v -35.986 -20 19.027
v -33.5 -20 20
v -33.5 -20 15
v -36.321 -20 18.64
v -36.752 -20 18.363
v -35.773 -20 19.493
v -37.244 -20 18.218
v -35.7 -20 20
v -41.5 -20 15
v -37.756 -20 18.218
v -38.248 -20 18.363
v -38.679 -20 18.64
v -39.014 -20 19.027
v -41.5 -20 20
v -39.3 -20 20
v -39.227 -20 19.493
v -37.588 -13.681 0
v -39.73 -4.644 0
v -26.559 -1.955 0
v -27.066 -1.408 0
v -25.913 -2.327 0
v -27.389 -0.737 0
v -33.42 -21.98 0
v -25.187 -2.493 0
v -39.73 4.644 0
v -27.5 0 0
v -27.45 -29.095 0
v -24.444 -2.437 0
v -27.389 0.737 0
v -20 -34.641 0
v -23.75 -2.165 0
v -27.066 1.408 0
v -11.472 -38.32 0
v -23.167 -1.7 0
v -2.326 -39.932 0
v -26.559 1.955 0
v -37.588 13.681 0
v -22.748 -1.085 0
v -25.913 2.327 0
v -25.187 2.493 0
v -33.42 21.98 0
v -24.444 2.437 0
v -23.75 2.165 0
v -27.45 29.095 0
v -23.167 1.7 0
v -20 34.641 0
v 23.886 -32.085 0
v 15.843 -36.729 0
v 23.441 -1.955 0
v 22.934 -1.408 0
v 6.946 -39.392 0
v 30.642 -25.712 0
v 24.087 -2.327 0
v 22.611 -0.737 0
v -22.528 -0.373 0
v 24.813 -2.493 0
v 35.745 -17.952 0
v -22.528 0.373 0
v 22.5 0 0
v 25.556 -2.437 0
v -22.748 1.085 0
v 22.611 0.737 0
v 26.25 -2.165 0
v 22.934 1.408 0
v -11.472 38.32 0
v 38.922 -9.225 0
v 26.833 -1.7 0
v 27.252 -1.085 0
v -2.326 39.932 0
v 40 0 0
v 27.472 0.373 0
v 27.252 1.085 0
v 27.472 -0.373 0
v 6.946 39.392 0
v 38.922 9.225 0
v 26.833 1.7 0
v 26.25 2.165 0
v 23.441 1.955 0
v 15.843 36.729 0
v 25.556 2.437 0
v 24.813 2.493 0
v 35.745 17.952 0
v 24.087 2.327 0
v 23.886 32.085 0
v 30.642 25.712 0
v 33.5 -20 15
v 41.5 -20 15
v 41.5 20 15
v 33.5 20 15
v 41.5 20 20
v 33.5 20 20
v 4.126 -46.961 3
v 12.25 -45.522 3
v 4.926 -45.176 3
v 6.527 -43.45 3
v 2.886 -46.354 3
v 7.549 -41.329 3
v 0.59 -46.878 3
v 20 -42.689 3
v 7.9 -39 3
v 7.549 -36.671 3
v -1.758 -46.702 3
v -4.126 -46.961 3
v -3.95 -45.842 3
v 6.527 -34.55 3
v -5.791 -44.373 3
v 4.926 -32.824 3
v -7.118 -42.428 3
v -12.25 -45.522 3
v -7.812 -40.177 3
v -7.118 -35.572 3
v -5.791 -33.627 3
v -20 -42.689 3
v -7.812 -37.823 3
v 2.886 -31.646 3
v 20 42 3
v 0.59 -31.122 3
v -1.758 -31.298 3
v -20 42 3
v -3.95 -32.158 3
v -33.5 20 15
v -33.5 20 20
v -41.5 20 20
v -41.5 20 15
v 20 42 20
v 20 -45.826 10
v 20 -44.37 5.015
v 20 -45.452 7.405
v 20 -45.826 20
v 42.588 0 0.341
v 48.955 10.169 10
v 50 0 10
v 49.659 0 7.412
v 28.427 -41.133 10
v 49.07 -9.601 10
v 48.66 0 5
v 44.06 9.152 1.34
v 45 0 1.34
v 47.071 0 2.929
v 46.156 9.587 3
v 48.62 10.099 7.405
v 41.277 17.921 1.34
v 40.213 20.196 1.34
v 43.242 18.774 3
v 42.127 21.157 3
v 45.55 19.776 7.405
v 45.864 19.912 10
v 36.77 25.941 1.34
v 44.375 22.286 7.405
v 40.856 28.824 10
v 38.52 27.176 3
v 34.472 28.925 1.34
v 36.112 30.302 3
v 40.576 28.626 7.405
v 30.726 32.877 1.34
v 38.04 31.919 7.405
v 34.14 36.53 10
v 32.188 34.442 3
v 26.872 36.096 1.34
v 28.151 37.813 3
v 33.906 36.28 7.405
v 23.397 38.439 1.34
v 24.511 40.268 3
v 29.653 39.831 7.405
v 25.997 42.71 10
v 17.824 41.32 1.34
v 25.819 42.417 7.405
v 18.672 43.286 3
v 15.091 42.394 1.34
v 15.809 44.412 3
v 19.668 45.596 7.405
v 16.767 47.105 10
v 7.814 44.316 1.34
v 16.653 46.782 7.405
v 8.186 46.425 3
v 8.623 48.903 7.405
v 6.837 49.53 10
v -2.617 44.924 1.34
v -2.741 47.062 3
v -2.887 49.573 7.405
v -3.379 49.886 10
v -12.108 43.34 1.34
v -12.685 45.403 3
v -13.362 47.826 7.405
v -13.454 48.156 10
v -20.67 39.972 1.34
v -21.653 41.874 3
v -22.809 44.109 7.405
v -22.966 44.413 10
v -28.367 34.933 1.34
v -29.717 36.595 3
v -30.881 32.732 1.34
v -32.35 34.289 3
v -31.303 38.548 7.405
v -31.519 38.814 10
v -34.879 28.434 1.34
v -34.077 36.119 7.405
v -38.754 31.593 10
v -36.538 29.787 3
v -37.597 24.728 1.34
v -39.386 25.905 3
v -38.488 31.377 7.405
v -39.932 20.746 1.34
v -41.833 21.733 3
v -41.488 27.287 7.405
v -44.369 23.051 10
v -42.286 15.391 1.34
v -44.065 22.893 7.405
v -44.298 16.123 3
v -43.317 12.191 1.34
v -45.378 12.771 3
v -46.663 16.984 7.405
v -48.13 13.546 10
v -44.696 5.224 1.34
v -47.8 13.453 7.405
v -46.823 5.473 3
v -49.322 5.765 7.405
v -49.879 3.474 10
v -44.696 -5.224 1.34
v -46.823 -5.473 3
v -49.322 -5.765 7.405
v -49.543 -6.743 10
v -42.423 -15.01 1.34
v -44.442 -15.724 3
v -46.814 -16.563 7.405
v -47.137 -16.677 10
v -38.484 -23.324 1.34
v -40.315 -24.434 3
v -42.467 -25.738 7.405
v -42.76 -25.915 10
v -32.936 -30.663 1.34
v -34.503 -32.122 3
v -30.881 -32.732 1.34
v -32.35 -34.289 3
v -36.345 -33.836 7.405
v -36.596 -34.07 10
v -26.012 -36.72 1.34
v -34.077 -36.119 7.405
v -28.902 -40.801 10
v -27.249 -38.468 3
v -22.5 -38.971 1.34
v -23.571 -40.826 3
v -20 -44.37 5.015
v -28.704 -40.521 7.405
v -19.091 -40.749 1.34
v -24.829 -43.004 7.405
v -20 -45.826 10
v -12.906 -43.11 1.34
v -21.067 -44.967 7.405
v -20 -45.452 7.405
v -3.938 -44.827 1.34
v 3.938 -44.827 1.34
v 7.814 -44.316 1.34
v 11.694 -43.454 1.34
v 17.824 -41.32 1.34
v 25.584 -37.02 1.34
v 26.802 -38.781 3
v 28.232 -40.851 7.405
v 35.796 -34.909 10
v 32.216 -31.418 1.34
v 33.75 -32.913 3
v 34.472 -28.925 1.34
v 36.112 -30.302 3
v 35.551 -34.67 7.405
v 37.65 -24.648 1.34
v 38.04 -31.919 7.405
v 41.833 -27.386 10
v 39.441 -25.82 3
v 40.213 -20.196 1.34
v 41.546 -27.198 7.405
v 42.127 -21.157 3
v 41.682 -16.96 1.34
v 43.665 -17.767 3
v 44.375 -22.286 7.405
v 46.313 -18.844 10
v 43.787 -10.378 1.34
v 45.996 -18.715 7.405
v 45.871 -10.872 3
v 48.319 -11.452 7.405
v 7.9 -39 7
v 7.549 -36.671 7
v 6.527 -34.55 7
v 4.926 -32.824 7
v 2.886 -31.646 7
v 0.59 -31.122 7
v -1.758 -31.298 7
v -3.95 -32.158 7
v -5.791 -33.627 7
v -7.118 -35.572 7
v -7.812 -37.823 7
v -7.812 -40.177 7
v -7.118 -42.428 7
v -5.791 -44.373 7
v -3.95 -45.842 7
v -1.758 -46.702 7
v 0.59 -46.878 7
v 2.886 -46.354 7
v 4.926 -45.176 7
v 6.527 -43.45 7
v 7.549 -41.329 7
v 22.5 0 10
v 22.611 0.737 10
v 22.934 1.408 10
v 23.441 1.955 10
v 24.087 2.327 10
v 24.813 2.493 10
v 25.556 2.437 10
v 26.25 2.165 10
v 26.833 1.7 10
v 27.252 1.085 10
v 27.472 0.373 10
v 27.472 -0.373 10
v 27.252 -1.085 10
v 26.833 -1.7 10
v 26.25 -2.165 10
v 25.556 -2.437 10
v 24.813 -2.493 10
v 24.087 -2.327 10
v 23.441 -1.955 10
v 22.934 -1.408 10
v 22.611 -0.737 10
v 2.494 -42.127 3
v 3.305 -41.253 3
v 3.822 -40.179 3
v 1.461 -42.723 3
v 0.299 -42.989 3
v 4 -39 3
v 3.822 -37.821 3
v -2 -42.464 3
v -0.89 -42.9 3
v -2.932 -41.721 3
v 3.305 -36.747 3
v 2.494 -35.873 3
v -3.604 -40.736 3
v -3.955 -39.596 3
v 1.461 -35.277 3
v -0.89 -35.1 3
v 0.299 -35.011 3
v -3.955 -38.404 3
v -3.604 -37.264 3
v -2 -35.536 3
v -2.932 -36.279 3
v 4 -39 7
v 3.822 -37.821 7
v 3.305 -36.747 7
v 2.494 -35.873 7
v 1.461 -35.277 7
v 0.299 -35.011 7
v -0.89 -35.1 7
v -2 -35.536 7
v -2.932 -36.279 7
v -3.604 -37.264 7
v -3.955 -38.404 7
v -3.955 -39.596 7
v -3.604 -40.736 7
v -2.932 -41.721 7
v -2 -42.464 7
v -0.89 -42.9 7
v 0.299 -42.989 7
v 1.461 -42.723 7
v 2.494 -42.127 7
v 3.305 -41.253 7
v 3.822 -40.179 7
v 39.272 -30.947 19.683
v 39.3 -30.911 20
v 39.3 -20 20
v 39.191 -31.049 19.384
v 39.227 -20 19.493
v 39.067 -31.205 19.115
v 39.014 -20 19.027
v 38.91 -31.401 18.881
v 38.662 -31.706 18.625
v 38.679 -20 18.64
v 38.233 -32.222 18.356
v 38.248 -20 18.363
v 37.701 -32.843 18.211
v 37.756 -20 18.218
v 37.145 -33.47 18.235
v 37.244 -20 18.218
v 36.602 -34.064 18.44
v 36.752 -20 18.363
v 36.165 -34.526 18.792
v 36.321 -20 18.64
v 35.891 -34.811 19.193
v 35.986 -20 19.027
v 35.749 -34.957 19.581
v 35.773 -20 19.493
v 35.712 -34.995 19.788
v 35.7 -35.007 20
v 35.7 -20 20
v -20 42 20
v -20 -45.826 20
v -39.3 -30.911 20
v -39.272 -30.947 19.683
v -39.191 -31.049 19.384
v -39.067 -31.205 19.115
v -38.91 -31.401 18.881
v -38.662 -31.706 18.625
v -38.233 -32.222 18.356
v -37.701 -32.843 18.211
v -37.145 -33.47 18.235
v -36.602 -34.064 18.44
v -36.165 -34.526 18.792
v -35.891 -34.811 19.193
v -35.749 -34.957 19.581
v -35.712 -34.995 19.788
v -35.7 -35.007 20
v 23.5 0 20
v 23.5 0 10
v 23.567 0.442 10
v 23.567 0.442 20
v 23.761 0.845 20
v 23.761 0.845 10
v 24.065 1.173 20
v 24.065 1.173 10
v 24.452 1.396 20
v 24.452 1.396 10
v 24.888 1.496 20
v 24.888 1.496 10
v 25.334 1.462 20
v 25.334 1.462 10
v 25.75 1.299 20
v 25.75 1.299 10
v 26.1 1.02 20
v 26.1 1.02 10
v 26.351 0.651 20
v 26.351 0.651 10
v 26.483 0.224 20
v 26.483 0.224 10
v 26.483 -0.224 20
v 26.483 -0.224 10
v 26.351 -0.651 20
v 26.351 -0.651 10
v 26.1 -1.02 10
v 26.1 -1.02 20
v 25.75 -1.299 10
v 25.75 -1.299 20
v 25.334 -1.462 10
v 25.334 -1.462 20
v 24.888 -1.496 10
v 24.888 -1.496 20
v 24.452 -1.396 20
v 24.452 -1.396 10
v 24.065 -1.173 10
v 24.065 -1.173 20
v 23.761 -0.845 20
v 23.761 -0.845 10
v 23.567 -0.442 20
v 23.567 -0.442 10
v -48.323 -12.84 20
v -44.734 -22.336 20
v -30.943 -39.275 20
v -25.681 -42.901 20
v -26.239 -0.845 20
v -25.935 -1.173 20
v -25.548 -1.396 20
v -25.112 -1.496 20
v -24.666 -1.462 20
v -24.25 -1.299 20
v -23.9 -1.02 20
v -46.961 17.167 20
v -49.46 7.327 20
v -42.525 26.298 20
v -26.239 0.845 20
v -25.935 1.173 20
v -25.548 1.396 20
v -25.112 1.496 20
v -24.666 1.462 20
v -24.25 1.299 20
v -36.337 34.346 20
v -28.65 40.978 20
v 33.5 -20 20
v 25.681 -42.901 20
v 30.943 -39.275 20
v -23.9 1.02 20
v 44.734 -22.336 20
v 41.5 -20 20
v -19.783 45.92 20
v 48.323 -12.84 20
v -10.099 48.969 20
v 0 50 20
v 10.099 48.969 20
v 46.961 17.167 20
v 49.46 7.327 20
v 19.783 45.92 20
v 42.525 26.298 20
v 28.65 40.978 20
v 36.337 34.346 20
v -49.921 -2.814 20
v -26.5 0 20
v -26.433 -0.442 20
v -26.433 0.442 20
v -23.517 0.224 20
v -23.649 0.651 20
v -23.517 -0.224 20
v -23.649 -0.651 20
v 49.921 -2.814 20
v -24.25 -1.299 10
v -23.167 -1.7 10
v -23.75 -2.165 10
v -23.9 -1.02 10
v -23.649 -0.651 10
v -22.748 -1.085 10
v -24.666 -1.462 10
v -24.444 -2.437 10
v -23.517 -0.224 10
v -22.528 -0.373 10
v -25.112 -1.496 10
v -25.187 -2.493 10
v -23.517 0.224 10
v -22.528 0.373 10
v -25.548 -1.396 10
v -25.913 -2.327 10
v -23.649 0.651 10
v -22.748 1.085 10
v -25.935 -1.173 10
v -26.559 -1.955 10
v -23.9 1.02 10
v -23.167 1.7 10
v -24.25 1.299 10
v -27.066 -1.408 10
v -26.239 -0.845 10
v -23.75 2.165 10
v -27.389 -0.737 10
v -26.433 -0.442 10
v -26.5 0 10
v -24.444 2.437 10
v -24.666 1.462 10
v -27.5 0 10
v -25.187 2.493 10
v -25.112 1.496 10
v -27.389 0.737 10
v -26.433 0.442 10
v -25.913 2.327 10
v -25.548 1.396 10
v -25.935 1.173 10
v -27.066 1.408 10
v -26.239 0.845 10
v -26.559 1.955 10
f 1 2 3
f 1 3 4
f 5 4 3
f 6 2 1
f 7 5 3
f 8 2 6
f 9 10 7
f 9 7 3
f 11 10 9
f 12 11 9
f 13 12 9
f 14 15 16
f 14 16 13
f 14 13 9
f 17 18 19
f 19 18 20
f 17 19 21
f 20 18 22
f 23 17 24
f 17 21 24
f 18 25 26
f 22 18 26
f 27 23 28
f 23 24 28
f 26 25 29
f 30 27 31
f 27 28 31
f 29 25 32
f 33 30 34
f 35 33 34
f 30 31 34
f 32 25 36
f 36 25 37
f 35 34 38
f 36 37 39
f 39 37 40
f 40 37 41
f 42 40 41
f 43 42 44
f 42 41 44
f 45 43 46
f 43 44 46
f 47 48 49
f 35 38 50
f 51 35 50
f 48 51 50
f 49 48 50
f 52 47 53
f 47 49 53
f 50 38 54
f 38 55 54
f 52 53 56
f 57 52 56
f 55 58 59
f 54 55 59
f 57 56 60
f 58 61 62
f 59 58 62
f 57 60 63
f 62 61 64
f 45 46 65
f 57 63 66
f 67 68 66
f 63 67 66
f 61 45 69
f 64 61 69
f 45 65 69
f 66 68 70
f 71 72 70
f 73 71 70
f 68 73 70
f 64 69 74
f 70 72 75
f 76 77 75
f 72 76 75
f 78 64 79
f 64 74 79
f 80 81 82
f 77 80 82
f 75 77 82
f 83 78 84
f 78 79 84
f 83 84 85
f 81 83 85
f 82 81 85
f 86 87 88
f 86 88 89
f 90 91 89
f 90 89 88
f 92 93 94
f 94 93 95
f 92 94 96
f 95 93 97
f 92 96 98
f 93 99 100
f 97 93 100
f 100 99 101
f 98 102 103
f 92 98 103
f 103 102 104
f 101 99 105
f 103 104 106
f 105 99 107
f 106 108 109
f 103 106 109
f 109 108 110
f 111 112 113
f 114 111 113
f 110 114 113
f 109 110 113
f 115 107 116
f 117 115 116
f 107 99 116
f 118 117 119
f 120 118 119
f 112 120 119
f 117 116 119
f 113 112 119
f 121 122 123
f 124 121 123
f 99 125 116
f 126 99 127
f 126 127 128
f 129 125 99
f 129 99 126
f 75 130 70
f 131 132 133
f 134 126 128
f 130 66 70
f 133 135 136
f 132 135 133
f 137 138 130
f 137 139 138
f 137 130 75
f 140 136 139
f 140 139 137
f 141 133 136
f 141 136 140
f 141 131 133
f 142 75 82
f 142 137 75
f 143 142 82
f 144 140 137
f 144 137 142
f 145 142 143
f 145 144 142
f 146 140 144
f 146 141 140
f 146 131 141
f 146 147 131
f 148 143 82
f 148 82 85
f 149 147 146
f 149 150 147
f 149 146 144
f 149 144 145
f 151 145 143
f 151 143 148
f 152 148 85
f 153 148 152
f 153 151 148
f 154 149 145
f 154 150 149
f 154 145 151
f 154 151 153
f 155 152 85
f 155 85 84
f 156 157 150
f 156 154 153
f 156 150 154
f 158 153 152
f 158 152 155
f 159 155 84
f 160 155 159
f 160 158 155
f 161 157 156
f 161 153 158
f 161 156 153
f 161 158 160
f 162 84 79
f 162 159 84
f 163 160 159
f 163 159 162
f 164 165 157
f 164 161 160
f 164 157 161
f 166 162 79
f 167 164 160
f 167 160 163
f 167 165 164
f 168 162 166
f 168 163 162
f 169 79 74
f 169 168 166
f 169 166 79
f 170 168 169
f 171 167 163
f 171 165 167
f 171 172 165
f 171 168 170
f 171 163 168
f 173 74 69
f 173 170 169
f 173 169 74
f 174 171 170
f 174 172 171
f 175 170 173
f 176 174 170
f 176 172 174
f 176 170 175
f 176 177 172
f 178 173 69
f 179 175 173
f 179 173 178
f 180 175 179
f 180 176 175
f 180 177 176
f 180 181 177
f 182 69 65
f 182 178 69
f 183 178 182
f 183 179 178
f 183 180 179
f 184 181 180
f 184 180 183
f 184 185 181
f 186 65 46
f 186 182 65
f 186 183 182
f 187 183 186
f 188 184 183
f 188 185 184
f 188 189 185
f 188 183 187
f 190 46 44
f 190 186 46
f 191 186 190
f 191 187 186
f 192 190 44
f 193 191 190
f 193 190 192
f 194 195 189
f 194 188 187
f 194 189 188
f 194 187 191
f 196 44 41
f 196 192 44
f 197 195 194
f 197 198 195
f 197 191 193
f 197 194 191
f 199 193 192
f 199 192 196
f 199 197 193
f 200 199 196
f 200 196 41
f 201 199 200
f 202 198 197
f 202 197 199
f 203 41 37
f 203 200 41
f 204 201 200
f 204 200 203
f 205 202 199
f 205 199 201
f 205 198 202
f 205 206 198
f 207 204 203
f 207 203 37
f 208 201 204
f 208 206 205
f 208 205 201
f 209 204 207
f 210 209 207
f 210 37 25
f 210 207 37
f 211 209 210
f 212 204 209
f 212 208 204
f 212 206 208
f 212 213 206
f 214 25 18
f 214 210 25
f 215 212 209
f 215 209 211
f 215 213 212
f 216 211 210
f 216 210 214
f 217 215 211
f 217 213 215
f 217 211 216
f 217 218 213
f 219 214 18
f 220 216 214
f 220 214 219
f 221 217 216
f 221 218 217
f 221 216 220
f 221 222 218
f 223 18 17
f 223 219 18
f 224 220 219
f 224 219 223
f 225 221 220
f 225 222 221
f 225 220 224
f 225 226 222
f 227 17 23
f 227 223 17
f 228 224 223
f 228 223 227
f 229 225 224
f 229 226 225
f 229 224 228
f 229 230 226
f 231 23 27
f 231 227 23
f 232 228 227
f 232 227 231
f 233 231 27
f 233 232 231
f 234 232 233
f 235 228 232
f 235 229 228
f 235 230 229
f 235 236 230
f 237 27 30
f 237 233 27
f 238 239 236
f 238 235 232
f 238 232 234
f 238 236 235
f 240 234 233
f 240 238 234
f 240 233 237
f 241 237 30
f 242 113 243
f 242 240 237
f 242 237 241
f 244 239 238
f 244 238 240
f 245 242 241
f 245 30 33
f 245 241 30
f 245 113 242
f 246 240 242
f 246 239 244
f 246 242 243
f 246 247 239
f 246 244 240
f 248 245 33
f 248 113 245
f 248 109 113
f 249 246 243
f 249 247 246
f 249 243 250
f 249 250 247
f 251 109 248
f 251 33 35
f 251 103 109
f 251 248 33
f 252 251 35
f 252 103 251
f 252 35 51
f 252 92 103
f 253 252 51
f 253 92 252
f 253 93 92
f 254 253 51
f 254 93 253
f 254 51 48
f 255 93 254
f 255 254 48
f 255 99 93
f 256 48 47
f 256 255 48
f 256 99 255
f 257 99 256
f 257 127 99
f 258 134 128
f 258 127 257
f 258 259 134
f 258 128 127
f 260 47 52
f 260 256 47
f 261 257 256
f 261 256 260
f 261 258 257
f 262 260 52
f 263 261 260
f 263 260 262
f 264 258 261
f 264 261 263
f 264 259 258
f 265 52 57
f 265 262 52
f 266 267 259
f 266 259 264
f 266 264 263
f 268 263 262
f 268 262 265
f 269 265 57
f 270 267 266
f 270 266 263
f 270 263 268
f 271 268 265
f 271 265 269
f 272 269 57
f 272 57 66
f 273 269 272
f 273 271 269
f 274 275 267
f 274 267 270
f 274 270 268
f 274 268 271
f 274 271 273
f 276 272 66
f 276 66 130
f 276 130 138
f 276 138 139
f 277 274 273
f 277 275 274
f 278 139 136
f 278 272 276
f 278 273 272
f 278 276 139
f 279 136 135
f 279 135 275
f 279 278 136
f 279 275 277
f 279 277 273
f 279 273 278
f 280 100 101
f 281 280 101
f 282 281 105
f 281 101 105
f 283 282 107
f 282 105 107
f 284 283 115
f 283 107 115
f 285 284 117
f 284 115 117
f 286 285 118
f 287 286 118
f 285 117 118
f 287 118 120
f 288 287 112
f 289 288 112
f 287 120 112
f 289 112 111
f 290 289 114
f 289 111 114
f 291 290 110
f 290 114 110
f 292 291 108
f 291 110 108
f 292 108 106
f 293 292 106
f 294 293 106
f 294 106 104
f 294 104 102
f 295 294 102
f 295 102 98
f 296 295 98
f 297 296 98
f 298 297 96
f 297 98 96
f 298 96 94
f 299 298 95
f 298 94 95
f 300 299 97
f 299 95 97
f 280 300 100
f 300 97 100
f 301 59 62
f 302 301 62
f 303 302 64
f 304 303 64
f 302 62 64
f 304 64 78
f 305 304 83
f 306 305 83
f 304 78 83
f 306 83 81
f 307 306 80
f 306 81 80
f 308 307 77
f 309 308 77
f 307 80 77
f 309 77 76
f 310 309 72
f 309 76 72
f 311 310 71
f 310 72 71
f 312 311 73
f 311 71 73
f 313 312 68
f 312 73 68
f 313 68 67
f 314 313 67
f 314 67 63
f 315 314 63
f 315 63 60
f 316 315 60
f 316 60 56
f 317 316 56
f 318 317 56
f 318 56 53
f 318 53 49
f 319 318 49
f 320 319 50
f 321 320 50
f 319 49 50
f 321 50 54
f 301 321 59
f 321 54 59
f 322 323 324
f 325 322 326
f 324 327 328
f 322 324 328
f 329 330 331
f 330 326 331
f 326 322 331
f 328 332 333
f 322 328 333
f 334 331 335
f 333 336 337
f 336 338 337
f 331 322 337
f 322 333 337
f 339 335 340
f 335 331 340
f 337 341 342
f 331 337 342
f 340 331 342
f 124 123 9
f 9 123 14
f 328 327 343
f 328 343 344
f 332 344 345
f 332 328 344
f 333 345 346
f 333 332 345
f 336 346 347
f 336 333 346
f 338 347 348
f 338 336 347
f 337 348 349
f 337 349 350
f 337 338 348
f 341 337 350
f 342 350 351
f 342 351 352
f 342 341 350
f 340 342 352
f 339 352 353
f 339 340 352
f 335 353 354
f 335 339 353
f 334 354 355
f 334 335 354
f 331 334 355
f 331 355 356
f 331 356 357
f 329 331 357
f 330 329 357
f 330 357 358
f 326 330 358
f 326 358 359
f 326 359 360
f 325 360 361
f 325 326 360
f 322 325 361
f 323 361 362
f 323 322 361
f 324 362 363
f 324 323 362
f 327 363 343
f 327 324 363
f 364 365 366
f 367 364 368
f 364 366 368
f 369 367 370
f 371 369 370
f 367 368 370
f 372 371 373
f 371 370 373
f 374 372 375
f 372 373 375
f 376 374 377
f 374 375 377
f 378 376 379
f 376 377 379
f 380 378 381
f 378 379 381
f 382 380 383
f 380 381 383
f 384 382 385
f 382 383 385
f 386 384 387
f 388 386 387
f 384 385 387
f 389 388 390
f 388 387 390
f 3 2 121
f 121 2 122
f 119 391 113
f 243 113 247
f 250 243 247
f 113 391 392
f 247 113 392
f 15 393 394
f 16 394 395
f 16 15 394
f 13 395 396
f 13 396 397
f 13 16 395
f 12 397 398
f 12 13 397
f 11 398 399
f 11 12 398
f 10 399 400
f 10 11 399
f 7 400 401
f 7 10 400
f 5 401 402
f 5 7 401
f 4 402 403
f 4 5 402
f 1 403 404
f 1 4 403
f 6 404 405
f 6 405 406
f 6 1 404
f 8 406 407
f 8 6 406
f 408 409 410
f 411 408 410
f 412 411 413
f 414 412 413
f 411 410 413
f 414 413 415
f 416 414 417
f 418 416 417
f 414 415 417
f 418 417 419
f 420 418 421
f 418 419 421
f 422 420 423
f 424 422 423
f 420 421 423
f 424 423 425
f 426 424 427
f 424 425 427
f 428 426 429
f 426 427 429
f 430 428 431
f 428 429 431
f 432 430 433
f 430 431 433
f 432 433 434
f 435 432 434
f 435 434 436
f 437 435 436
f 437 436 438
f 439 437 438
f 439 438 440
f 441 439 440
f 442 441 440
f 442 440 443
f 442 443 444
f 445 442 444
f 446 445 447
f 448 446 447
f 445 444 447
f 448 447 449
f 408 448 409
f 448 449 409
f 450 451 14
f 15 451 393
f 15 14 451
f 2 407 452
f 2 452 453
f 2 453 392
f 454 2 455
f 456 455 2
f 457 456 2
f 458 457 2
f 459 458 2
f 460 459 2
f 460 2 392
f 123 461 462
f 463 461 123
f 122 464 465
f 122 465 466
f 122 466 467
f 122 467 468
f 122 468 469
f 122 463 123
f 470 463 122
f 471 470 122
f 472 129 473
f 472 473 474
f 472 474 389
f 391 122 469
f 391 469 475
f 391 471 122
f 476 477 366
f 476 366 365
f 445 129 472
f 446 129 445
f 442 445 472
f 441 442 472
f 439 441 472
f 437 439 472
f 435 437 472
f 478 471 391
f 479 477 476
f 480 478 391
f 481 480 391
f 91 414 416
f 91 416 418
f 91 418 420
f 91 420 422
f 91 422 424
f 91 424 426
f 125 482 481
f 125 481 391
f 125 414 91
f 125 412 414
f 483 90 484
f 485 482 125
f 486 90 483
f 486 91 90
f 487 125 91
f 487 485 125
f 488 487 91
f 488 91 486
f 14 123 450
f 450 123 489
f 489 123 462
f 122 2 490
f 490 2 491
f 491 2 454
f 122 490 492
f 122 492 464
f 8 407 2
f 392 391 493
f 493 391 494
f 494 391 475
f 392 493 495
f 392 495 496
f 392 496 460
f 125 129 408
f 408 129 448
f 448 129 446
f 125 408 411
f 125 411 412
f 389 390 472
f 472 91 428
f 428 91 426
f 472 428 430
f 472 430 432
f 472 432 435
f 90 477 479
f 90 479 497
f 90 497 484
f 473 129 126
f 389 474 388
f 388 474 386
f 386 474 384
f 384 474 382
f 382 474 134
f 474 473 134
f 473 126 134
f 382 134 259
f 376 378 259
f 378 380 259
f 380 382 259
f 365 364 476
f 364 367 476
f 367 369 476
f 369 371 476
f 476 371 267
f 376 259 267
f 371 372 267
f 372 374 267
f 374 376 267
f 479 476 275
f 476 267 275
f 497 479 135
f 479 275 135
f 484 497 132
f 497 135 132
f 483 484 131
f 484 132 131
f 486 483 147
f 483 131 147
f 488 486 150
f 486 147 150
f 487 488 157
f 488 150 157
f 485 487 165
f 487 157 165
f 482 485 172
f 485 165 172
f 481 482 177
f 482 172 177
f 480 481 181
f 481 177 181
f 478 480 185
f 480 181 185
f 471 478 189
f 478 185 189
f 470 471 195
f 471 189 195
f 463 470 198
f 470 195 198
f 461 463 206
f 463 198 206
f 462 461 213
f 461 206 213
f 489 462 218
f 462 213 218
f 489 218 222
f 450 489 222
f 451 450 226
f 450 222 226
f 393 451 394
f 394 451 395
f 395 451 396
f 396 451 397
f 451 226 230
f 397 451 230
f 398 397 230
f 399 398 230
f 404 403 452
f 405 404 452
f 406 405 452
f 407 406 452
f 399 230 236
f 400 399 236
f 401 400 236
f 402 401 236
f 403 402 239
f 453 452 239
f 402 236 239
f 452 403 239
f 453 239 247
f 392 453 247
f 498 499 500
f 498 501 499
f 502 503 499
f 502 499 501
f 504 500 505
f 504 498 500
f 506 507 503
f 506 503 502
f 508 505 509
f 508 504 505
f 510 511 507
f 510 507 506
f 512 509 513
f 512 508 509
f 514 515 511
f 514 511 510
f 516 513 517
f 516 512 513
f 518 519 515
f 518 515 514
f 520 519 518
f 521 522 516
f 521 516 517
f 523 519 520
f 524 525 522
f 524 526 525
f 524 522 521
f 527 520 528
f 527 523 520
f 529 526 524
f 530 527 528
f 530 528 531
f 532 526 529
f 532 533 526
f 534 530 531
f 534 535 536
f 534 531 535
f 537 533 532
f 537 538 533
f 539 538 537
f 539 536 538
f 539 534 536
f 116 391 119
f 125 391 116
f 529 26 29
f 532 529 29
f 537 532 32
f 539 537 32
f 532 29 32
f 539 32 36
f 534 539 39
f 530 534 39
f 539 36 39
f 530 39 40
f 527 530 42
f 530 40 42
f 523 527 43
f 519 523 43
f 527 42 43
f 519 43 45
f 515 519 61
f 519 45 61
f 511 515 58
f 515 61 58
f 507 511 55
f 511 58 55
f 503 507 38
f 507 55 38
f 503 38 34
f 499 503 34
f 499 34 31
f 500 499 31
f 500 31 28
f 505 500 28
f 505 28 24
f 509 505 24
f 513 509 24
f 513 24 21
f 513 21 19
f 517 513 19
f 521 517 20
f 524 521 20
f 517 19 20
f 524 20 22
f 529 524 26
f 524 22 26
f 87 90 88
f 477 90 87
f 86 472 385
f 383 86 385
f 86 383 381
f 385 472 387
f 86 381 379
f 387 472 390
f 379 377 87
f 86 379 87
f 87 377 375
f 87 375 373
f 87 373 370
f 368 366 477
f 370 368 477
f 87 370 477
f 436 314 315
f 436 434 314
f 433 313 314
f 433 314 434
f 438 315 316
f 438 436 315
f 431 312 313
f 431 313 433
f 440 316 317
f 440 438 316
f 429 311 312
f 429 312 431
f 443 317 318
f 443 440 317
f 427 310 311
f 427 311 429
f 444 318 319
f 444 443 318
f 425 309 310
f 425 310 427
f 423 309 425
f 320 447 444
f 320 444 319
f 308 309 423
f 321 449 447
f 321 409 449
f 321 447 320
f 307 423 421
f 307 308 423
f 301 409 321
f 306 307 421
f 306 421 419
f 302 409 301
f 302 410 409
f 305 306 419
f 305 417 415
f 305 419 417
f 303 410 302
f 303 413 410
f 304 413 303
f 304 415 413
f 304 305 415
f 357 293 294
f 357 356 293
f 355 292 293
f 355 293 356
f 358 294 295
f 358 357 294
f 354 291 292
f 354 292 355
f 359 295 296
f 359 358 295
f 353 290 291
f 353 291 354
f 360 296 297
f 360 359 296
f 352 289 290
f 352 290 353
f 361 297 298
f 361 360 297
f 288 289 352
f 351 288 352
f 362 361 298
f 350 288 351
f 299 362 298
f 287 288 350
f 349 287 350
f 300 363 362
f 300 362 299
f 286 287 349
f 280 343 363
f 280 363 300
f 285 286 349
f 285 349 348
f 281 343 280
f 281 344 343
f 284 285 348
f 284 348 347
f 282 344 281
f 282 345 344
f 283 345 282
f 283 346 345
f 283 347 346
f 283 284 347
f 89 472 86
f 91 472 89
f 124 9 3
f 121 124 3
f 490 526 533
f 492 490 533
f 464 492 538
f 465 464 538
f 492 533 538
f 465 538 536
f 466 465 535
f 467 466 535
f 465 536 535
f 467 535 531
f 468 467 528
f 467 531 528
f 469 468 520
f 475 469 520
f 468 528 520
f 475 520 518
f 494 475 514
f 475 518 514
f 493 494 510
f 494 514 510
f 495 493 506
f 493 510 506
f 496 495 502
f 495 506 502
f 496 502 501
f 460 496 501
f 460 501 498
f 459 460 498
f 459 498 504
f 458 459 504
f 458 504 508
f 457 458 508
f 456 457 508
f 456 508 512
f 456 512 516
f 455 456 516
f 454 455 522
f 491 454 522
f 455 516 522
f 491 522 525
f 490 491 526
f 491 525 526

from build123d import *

# Parameters (mm, degrees)
SKETCH_1_R          = 50
EXTRUDE_1_DEPTH     = 20
CUT_EXTRUDE_1_DEPTH = 17
SKETCH_3_R          = 7.9
SKETCH_3_R_2        = 4
EXTRUDE_2_DEPTH     = 4
CUT_EXTRUDE_2_DEPTH = 5
SKETCH_7_R          = 1.8
CUT_EXTRUDE_3_DEPTH = 19
SKETCH_8_W          = 40
SKETCH_8_H          = 17
CUT_EXTRUDE_4_DEPTH = 2
FILLET_1_R          = 10
SKETCH_10_R         = 2.5
CUT_EXTRUDE_5_DEPTH = 10
SKETCH_11_R         = 1.5
CUT_EXTRUDE_6_DEPTH = 10


with BuildPart() as part:
    # 草图1 → 凸台-拉伸1 (new body)
    with BuildSketch(Plane.XY):
        Circle(SKETCH_1_R)
    extrude(amount=EXTRUDE_1_DEPTH)

    # 草图2 → 切除-拉伸1 (cut)
    with BuildSketch(Plane.XY.offset(20)):
        Polygon((-20, -37), (-20, 0), (-20, 40), (20, 40), (20, -58.754478709), (-20, -58.754478709), align=None)
    extrude(amount=-CUT_EXTRUDE_1_DEPTH, mode=Mode.SUBTRACT)

    # 草图3 → 凸台-拉伸2 (add)
    with BuildSketch(Plane.XY.offset(3)):
        with Locations((0, -39)):
            Circle(SKETCH_3_R)
        with Locations((0, -39)):
            Circle(SKETCH_3_R_2, mode=Mode.SUBTRACT)
    extrude(amount=EXTRUDE_2_DEPTH)

    # 草图5 → 切除-拉伸2 (cut)
    with BuildSketch(Plane.XY.offset(20)):
        Polygon((37.5, -20), (33.5, -20), (33.5, 20), (41.5, 20), (41.5, -20), align=None)
    cut_extrude_2 = extrude(amount=-CUT_EXTRUDE_2_DEPTH, mode=Mode.SUBTRACT)

    # 草图7 → 切除-拉伸3 (cut)
    with BuildSketch(Plane(origin=(0, -20, 0), x_dir=(1, 0, 0), z_dir=(0, 1, 0))):
        with Locations((37.5, -20)):
            Circle(SKETCH_7_R)
    cut_extrude_3 = extrude(amount=-CUT_EXTRUDE_3_DEPTH, mode=Mode.SUBTRACT)

    # 镜向1: 切除-拉伸2, 切除-拉伸3 across plane
    add(cut_extrude_2.mirror(Plane(origin=(0, 0, 0), x_dir=(0, 0, 1), z_dir=(1, 0, 0))), mode=Mode.SUBTRACT)
    add(cut_extrude_3.mirror(Plane(origin=(0, 0, 0), x_dir=(0, 0, 1), z_dir=(1, 0, 0))), mode=Mode.SUBTRACT)

    # 草图8 → 切除-拉伸4 (cut)
    with BuildSketch(Plane.XZ.offset(-40)):
        with Locations((0, 11.5)):
            Rectangle(SKETCH_8_W, SKETCH_8_H)
    extrude(amount=-CUT_EXTRUDE_4_DEPTH, mode=Mode.SUBTRACT)

    # 圆角1
    # the kernel refuses this fillet: 10 mm, written as the material it takes off along each edge
    with BuildSketch(Plane(origin=(0, 0, 0), x_dir=(1, 0, 0), z_dir=(0, -1, 0))) as fillet_1_piece_1:
        with BuildLine():
            CenterArc((50 - FILLET_1_R, FILLET_1_R), FILLET_1_R, 270, 90)
            Line((50 - FILLET_1_R, 0), (50, 0))
            Line((50, 0), (50, FILLET_1_R))
        make_face()
    revolve(axis=Axis((0, 0, 0), (0, 0, 1)), mode=Mode.SUBTRACT)

    # 草图10 → 切除-拉伸5 (cut)
    with BuildSketch(Plane(origin=(0, 0, 0), x_dir=(-1, 0, 0), z_dir=(0, 0, -1))):
        with Locations((25, 0)):
            Circle(SKETCH_10_R)
        with Locations((-25, 0)):
            Circle(SKETCH_10_R)
    extrude(amount=-CUT_EXTRUDE_5_DEPTH, mode=Mode.SUBTRACT)

    # 草图11 → 切除-拉伸6 (cut)
    with BuildSketch(Plane(origin=(0, 0, 10), x_dir=(-1, 0, 0), z_dir=(0, 0, -1))):
        with Locations((-25, 0)):
            Circle(SKETCH_11_R)
        with Locations((25, 0)):
            Circle(SKETCH_11_R)
    extrude(amount=-CUT_EXTRUDE_6_DEPTH, mode=Mode.SUBTRACT)


solid = part.part
